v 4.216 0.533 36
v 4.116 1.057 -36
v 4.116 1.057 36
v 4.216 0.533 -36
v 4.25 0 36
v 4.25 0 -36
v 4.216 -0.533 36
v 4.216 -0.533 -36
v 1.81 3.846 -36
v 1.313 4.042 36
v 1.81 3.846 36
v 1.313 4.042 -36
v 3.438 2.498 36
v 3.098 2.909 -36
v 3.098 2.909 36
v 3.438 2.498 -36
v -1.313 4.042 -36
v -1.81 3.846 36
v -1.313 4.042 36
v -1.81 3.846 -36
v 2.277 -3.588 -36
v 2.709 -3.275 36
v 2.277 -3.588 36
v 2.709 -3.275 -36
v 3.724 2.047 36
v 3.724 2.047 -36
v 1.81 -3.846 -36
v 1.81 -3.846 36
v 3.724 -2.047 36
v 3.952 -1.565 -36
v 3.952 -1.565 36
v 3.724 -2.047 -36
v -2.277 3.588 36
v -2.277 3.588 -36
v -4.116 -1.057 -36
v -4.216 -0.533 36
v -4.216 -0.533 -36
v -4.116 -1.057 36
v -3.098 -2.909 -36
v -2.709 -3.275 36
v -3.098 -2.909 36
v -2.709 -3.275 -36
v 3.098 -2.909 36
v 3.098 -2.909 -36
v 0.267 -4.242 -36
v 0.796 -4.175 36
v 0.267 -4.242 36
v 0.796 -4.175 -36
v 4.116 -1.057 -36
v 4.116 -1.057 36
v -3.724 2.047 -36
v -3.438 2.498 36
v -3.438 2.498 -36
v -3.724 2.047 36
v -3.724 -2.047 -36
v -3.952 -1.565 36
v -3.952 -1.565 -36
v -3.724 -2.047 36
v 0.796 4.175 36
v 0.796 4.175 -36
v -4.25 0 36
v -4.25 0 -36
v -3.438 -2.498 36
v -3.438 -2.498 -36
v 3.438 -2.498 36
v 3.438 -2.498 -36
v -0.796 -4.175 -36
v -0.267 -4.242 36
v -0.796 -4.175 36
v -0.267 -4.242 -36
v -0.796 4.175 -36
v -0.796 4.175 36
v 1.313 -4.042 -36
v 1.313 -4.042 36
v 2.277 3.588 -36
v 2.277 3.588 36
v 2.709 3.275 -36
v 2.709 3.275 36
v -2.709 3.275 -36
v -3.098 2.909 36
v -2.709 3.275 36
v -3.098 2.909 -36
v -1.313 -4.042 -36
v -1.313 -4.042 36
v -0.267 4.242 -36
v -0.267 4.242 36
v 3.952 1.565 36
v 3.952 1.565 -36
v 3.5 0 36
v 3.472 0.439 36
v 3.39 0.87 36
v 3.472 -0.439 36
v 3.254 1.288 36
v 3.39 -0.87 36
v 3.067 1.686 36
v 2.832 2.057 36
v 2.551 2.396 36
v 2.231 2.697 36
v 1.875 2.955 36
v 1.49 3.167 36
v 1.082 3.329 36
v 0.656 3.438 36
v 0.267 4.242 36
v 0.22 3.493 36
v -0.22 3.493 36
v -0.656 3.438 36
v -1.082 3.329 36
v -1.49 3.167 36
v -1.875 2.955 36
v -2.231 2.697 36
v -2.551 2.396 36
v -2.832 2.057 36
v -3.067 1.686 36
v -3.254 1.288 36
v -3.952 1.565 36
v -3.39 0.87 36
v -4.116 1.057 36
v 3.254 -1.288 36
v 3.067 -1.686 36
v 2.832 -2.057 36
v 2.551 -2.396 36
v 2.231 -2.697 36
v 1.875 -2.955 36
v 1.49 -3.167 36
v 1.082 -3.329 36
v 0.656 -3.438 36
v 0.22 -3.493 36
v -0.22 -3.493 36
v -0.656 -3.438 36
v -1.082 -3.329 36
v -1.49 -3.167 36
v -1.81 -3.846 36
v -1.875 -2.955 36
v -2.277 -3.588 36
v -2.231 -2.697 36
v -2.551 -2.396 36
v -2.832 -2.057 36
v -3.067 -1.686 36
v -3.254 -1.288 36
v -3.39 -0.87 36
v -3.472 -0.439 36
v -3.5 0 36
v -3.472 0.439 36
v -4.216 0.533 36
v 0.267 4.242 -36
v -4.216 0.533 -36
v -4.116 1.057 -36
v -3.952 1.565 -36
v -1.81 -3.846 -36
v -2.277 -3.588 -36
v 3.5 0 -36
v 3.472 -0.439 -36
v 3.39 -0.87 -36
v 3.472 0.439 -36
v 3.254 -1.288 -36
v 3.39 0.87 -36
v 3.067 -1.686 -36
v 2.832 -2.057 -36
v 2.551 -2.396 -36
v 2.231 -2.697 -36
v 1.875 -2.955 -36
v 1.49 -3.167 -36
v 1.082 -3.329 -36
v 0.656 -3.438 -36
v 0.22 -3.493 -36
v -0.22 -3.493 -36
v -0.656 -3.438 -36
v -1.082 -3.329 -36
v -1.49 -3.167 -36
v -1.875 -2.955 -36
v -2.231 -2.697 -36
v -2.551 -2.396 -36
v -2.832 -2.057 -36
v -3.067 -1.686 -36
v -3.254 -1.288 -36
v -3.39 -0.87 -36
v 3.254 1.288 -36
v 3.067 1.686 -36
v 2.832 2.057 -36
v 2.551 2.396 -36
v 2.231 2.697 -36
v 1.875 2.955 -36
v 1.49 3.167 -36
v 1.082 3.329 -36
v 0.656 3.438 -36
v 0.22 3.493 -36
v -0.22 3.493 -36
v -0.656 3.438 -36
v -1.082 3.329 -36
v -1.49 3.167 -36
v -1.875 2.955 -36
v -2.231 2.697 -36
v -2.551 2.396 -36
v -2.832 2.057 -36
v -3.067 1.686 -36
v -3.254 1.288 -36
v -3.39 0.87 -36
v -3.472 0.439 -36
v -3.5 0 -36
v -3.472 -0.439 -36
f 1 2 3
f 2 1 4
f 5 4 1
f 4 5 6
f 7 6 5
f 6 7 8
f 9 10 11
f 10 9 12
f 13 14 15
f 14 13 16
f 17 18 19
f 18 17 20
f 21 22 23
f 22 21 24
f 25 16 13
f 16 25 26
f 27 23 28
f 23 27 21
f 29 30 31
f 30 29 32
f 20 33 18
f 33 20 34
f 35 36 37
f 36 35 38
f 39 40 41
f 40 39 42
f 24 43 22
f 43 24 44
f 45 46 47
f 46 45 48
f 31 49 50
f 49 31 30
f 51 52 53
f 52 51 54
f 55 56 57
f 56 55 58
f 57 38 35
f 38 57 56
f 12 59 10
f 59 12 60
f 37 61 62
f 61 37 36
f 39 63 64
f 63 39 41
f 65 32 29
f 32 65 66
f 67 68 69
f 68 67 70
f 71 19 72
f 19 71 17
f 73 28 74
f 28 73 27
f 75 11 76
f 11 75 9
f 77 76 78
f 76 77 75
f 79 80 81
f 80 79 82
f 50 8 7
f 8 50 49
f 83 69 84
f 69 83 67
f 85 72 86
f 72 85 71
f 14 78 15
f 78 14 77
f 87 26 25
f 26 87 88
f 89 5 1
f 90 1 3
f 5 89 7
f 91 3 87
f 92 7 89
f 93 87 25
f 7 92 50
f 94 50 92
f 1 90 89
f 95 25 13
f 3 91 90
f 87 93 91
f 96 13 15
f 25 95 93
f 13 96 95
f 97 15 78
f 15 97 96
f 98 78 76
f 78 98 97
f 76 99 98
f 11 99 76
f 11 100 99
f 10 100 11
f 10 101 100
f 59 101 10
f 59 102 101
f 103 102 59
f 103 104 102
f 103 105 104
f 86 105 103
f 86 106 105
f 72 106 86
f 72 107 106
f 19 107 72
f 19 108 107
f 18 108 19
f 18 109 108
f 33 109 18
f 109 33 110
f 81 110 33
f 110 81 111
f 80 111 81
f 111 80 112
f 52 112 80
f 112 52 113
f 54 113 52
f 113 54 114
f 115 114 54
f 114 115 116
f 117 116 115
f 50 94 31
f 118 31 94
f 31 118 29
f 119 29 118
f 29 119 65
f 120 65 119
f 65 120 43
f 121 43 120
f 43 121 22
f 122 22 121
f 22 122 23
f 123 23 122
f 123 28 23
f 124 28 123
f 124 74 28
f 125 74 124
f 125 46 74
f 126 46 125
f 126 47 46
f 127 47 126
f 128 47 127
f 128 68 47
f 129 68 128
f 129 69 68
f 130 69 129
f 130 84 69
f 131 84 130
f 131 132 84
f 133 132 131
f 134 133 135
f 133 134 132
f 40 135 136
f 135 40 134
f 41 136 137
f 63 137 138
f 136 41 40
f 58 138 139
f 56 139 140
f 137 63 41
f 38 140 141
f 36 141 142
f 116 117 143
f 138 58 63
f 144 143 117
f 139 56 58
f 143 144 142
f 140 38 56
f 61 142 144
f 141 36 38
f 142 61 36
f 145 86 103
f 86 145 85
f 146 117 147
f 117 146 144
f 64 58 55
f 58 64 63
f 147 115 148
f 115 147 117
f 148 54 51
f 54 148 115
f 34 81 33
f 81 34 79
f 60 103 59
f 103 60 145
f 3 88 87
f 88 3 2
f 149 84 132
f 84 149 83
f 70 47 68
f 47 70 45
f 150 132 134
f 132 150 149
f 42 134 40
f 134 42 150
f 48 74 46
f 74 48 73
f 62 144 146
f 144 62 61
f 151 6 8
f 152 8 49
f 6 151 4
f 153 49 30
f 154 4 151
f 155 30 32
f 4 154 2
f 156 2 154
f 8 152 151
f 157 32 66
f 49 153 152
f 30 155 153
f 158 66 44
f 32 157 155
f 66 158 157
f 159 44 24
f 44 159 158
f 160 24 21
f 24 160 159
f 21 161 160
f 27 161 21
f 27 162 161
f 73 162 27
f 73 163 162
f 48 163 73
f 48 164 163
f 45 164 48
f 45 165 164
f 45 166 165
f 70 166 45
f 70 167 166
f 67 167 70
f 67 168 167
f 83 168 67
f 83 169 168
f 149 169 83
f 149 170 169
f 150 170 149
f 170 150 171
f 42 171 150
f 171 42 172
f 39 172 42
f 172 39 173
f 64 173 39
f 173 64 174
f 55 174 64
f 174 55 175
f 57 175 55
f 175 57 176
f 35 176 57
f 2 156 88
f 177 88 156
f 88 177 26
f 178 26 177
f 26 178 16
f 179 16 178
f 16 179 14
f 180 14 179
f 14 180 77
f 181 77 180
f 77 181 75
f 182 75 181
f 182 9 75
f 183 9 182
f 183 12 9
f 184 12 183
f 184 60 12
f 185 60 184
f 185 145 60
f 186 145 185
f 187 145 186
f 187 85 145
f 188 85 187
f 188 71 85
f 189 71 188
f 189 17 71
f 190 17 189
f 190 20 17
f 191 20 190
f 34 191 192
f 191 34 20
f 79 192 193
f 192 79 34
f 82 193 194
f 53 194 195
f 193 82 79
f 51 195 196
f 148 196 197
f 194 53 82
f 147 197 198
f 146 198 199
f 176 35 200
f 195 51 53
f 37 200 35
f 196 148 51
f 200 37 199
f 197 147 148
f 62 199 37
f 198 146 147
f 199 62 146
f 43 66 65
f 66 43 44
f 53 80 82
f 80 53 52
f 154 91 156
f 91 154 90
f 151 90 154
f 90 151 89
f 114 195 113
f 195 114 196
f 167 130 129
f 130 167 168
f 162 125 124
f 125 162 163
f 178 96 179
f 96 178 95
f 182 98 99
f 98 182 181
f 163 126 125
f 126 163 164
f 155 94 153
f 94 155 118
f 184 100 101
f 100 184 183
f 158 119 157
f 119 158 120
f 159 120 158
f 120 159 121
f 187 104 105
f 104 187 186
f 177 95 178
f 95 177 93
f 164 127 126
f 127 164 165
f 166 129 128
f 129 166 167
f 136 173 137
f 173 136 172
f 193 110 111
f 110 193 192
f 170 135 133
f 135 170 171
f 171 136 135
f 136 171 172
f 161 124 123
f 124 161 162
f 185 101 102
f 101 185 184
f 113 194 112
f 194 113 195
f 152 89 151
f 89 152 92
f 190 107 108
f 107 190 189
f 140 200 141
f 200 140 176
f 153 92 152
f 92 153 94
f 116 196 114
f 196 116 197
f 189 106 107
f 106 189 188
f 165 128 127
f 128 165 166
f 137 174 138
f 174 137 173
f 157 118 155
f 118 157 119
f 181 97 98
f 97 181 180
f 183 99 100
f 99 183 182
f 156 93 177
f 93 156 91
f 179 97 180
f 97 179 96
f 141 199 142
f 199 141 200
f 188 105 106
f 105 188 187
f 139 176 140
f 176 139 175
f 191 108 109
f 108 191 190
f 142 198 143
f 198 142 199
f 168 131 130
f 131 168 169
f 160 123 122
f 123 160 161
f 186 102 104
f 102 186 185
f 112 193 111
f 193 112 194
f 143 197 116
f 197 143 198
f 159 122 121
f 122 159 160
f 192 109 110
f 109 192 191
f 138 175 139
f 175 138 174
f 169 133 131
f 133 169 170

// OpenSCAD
$fn = 50;


difference() {
	union() {
		translate(v = [0, 0, -36.0000000000]) {
			cylinder(h = 72, r = 4.2500000000);
		}
	}
	union() {
		translate(v = [0, 0, -100.0000000000]) {
			cylinder(h = 200, r = 3.5000000000);
		}
	}
}
